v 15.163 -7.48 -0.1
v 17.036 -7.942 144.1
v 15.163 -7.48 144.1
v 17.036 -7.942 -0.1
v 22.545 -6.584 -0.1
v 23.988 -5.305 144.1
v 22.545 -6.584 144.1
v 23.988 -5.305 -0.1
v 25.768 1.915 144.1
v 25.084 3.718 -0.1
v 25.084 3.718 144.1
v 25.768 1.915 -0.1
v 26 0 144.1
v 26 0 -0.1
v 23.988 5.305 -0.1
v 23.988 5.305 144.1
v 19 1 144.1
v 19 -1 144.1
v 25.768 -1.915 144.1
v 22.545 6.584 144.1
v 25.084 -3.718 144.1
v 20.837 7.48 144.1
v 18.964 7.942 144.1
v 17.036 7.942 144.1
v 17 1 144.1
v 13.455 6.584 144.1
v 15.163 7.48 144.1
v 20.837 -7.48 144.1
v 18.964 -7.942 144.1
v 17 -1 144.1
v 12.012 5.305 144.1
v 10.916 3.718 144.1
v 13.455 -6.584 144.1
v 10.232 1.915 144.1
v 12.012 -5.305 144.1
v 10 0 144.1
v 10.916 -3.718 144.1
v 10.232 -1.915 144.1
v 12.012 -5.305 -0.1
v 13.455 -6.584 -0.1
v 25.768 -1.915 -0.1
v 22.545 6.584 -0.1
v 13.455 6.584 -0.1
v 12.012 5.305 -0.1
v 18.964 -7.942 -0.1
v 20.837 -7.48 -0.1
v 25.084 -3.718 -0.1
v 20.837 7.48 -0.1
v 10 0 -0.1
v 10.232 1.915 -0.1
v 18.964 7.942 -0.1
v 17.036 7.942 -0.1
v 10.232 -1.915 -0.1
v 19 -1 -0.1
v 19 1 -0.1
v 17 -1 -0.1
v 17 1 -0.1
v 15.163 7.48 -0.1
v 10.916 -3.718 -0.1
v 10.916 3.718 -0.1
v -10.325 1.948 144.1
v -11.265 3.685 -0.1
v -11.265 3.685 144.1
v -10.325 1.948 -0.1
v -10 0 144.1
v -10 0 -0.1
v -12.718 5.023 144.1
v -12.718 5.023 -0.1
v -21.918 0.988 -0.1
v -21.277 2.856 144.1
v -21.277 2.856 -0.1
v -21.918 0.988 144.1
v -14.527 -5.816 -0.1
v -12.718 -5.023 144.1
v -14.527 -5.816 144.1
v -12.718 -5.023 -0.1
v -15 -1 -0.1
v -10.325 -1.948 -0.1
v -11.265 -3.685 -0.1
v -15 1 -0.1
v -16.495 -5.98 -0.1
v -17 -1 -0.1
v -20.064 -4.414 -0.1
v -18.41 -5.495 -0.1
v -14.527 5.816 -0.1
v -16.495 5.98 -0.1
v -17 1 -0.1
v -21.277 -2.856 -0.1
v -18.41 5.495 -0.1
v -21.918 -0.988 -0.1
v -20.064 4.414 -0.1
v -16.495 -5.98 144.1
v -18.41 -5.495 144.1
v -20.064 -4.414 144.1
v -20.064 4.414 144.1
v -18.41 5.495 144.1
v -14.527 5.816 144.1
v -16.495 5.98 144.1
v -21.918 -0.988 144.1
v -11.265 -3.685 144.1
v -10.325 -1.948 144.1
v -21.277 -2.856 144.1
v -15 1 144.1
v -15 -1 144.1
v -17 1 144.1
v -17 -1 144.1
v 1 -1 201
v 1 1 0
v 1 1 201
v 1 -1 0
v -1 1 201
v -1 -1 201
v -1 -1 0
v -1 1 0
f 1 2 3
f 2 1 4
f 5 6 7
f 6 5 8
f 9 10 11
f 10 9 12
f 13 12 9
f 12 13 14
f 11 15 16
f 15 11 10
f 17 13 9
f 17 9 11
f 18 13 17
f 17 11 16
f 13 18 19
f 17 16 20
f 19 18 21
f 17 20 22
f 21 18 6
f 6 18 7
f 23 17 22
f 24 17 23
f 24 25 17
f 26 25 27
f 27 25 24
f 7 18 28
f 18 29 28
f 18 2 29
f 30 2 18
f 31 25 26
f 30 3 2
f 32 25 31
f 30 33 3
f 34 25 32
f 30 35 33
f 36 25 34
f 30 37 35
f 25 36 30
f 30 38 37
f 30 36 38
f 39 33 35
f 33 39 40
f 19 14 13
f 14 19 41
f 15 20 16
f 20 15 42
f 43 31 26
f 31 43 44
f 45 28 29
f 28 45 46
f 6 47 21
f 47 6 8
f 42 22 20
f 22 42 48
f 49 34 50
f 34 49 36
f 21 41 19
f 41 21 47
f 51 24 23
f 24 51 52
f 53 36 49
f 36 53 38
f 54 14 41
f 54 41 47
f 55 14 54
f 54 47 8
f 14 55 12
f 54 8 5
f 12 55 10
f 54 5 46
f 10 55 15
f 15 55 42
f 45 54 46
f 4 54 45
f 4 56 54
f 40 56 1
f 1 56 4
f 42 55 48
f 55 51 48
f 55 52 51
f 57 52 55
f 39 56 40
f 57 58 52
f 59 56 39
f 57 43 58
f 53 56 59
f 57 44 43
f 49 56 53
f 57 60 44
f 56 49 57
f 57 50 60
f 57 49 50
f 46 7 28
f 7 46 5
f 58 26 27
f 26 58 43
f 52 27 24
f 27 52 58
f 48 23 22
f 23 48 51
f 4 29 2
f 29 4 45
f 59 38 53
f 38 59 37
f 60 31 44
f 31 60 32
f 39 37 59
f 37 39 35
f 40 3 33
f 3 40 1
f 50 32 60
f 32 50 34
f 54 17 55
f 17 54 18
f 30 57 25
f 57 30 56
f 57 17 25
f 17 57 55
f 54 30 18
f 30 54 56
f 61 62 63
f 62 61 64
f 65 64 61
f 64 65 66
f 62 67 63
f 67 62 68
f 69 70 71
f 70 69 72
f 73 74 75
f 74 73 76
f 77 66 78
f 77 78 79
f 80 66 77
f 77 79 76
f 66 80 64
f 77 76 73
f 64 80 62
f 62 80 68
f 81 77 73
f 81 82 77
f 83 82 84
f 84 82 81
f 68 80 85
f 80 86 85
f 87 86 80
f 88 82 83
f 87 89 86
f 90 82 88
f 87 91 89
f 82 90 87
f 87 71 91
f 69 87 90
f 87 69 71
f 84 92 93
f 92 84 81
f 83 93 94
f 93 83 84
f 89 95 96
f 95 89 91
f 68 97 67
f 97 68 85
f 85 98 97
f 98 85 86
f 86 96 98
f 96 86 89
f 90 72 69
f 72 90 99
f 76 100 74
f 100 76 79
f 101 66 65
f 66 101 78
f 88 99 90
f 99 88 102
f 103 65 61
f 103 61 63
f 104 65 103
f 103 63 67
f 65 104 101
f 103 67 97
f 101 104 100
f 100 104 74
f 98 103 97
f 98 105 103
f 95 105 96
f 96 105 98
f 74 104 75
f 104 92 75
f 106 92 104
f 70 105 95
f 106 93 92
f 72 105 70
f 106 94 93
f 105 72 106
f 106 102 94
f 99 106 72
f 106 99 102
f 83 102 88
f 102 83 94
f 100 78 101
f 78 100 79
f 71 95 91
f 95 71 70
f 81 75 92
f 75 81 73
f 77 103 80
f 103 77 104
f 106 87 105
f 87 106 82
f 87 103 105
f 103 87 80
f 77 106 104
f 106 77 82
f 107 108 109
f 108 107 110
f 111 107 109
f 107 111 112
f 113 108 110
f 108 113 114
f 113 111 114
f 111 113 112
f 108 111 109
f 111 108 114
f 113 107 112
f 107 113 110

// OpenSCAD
// file: Settings.scad
// Mesurements Of Platform Actual & Global Settings

// Mesurements ACTUAL

PlateWidth = 228;
PlateDepth = 145;
PlateHeight = 5;

ArmWidth = 20;
ArmHeight = 24;
ArmForwardProjection = 25;
ArmRearProjection = 50;
ArmVOffset = 15;

BaseWidth = 129;
BaseHeight = 5;
BaseForwardProjection = 10;
BaseRearProjection = 10;
BaseVOffset = 20;

BaseDeflectorLength = 20;
BaseDeflectorAngle = 45;

ScrewsWidthOutset = 35;
ScrewsDepthOutset = 35;
ScrewsHeadRadius = 10;
ScrewsHeadHeight = 2;
ScrewsHeadProtrusion = 5;
ScrewsShaftRadius = 2;
ScrewsHeadCutoutRadius = 2;


RearPlugWidth = 10;
RearPlugHeight = 5;
RearPlugVOffset = 1;





// Options
// ****************************************************************************************************

d = 0.1;   //Delta

ClipSticksize = 3;
PlateThickness = 8;



TensionerBearingRadius = 2;
TensionerOffsetRadius = 15;
TensionerAngle = 45;
TensionerBearingExtention = 3;
TensionerInset = 2;





//lips to keep the belt in
Lip = 3;
TopLip = 500;
UpperLip = 500;
LowerLip = 500;
BottomLip = 500;


RollerCore = 2;
RollerClearance = 0.5;
RollerLength = PlateDepth - 2*RollerClearance;

UpperRollerProjection  = 40;
UpperRollerRadius = 8;

LowerRollerProjection = 20;
LowerRollerRadius = 6;

UpperRollerBearingCutoutRadius = 3;
LowerRollerBearingCutoutRadius = 3;

// Calculated
// ************************************************************************************************************
PlateX = BaseWidth/2;

RollerLength = PlateDepth - 2*RollerClearance;
PlateArmOverhang = PlateWidth/2 - BaseWidth/2  - ArmWidth; 

UpperRollerPlateX = ArmWidth+PlateArmOverhang+UpperRollerProjection-UpperRollerRadius;
UpperRollerPlateY = -UpperRollerRadius; 


LowerRollerPlateX = ArmWidth+PlateArmOverhang+LowerRollerProjection-LowerRollerRadius;
LowerRollerPlateY = -(ArmVOffset+ArmHeight)+LowerRollerRadius;
// main file
// Roller Project Part #1 Front Bracket

include <Settings.scad>;

translate(v = [10+UpperRollerRadius,0,0]){
UpperRoller();
}
translate(v = [-10-LowerRollerRadius,0,0]){
LowerRoller();
}

CoreRod();

module UpperRoller(){
	HollowCylinder(UpperRollerRadius, RollerLength, RollerCore);
}

module LowerRoller(){
	HollowCylinder(LowerRollerRadius, RollerLength, RollerCore);
}

module CoreRod(){
	translate(v = [-RollerCore/2,-RollerCore/2,0]){
		cube(size = [RollerCore,RollerCore,RollerLength+2*RollerClearance+2*PlateThickness+40]);
	}
}

module HollowCylinder(r,h,c){
	difference(){	
		translate(v = [0,0,-d]){
			cylinder(h = h+2*d, r =  r);
		}
		translate(v = [-c/2,-c/2, - 2*d]){
			cube(size = [c,c,h+4*d]);
		}
	}
}
